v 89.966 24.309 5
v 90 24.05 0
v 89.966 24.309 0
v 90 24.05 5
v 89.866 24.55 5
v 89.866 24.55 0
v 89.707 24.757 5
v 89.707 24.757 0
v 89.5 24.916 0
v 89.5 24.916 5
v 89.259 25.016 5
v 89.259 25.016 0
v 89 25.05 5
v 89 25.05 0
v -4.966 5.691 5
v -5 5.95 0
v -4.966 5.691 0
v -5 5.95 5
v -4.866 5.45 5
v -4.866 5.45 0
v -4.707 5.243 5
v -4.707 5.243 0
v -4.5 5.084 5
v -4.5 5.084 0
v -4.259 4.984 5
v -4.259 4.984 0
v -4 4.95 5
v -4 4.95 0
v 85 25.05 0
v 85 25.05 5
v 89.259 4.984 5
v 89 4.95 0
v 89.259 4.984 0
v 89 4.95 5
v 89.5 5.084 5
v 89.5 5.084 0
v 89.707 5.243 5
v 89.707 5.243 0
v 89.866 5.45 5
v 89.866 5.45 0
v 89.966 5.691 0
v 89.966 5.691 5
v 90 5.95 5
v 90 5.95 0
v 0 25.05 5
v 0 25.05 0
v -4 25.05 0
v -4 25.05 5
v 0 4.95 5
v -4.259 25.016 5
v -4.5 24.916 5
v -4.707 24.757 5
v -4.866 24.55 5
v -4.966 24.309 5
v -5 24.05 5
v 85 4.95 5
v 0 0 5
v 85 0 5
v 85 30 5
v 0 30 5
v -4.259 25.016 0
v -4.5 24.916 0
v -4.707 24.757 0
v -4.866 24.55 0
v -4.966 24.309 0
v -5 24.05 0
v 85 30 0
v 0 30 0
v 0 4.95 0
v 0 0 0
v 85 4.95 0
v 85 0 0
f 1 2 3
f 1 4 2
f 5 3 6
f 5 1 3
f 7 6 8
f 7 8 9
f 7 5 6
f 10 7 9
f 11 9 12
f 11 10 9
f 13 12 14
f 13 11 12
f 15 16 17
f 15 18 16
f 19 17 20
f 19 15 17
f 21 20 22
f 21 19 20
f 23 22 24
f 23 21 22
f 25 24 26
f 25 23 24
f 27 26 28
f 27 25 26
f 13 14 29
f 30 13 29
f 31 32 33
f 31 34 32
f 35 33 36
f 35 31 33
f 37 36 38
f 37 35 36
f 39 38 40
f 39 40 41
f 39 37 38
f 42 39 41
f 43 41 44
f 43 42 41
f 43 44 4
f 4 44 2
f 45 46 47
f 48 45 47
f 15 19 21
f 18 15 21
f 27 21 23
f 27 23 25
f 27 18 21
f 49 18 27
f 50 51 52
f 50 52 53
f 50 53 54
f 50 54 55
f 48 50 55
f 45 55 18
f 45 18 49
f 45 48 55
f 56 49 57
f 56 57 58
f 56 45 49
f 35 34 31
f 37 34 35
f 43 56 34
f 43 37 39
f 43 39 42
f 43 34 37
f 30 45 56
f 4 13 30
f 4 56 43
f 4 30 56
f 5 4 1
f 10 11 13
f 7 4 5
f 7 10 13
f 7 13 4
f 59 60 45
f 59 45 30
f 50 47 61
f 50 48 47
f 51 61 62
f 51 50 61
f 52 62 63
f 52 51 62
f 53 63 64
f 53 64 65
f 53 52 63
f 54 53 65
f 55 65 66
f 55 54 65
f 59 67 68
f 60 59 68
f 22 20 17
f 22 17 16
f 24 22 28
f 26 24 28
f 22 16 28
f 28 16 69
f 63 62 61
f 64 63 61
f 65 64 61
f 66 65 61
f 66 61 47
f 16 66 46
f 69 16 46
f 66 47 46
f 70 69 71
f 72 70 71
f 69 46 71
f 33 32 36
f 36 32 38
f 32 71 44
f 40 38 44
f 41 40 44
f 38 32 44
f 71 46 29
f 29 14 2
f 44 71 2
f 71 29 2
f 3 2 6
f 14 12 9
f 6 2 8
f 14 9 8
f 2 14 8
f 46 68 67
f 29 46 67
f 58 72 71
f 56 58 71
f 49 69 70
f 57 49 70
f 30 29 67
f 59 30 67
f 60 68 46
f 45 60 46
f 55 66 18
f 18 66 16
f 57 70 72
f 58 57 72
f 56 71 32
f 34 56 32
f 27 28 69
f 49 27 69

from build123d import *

# Parameters (mm, degrees)
BOSS_EXTRUDE1_DEPTH = 5
FILLET1_R           = 1


with BuildPart() as part:
    # Sketch1 → Boss-Extrude1 (new body)
    with BuildSketch(Plane.XY):
        Polygon((85, 25.05), (85, 30), (0, 30), (0, 25.05), (-5, 25.05), (-5, 4.95), (0, 4.95), (0, 0), (85, 0), (85, 4.95), (90, 4.95), (90, 25.05), align=None)
    extrude(amount=BOSS_EXTRUDE1_DEPTH)

    # Fillet1
    fillet1_edges = [part.edges().sort_by_distance(p)[0] for p in [
        (-5, 4.95, 2.5),
        (-5, 25.05, 2.5),
        (90, 25.05, 2.5),
        (90, 4.95, 2.5),
    ]]
    fillet(fillet1_edges, radius=FILLET1_R)


solid = part.part
